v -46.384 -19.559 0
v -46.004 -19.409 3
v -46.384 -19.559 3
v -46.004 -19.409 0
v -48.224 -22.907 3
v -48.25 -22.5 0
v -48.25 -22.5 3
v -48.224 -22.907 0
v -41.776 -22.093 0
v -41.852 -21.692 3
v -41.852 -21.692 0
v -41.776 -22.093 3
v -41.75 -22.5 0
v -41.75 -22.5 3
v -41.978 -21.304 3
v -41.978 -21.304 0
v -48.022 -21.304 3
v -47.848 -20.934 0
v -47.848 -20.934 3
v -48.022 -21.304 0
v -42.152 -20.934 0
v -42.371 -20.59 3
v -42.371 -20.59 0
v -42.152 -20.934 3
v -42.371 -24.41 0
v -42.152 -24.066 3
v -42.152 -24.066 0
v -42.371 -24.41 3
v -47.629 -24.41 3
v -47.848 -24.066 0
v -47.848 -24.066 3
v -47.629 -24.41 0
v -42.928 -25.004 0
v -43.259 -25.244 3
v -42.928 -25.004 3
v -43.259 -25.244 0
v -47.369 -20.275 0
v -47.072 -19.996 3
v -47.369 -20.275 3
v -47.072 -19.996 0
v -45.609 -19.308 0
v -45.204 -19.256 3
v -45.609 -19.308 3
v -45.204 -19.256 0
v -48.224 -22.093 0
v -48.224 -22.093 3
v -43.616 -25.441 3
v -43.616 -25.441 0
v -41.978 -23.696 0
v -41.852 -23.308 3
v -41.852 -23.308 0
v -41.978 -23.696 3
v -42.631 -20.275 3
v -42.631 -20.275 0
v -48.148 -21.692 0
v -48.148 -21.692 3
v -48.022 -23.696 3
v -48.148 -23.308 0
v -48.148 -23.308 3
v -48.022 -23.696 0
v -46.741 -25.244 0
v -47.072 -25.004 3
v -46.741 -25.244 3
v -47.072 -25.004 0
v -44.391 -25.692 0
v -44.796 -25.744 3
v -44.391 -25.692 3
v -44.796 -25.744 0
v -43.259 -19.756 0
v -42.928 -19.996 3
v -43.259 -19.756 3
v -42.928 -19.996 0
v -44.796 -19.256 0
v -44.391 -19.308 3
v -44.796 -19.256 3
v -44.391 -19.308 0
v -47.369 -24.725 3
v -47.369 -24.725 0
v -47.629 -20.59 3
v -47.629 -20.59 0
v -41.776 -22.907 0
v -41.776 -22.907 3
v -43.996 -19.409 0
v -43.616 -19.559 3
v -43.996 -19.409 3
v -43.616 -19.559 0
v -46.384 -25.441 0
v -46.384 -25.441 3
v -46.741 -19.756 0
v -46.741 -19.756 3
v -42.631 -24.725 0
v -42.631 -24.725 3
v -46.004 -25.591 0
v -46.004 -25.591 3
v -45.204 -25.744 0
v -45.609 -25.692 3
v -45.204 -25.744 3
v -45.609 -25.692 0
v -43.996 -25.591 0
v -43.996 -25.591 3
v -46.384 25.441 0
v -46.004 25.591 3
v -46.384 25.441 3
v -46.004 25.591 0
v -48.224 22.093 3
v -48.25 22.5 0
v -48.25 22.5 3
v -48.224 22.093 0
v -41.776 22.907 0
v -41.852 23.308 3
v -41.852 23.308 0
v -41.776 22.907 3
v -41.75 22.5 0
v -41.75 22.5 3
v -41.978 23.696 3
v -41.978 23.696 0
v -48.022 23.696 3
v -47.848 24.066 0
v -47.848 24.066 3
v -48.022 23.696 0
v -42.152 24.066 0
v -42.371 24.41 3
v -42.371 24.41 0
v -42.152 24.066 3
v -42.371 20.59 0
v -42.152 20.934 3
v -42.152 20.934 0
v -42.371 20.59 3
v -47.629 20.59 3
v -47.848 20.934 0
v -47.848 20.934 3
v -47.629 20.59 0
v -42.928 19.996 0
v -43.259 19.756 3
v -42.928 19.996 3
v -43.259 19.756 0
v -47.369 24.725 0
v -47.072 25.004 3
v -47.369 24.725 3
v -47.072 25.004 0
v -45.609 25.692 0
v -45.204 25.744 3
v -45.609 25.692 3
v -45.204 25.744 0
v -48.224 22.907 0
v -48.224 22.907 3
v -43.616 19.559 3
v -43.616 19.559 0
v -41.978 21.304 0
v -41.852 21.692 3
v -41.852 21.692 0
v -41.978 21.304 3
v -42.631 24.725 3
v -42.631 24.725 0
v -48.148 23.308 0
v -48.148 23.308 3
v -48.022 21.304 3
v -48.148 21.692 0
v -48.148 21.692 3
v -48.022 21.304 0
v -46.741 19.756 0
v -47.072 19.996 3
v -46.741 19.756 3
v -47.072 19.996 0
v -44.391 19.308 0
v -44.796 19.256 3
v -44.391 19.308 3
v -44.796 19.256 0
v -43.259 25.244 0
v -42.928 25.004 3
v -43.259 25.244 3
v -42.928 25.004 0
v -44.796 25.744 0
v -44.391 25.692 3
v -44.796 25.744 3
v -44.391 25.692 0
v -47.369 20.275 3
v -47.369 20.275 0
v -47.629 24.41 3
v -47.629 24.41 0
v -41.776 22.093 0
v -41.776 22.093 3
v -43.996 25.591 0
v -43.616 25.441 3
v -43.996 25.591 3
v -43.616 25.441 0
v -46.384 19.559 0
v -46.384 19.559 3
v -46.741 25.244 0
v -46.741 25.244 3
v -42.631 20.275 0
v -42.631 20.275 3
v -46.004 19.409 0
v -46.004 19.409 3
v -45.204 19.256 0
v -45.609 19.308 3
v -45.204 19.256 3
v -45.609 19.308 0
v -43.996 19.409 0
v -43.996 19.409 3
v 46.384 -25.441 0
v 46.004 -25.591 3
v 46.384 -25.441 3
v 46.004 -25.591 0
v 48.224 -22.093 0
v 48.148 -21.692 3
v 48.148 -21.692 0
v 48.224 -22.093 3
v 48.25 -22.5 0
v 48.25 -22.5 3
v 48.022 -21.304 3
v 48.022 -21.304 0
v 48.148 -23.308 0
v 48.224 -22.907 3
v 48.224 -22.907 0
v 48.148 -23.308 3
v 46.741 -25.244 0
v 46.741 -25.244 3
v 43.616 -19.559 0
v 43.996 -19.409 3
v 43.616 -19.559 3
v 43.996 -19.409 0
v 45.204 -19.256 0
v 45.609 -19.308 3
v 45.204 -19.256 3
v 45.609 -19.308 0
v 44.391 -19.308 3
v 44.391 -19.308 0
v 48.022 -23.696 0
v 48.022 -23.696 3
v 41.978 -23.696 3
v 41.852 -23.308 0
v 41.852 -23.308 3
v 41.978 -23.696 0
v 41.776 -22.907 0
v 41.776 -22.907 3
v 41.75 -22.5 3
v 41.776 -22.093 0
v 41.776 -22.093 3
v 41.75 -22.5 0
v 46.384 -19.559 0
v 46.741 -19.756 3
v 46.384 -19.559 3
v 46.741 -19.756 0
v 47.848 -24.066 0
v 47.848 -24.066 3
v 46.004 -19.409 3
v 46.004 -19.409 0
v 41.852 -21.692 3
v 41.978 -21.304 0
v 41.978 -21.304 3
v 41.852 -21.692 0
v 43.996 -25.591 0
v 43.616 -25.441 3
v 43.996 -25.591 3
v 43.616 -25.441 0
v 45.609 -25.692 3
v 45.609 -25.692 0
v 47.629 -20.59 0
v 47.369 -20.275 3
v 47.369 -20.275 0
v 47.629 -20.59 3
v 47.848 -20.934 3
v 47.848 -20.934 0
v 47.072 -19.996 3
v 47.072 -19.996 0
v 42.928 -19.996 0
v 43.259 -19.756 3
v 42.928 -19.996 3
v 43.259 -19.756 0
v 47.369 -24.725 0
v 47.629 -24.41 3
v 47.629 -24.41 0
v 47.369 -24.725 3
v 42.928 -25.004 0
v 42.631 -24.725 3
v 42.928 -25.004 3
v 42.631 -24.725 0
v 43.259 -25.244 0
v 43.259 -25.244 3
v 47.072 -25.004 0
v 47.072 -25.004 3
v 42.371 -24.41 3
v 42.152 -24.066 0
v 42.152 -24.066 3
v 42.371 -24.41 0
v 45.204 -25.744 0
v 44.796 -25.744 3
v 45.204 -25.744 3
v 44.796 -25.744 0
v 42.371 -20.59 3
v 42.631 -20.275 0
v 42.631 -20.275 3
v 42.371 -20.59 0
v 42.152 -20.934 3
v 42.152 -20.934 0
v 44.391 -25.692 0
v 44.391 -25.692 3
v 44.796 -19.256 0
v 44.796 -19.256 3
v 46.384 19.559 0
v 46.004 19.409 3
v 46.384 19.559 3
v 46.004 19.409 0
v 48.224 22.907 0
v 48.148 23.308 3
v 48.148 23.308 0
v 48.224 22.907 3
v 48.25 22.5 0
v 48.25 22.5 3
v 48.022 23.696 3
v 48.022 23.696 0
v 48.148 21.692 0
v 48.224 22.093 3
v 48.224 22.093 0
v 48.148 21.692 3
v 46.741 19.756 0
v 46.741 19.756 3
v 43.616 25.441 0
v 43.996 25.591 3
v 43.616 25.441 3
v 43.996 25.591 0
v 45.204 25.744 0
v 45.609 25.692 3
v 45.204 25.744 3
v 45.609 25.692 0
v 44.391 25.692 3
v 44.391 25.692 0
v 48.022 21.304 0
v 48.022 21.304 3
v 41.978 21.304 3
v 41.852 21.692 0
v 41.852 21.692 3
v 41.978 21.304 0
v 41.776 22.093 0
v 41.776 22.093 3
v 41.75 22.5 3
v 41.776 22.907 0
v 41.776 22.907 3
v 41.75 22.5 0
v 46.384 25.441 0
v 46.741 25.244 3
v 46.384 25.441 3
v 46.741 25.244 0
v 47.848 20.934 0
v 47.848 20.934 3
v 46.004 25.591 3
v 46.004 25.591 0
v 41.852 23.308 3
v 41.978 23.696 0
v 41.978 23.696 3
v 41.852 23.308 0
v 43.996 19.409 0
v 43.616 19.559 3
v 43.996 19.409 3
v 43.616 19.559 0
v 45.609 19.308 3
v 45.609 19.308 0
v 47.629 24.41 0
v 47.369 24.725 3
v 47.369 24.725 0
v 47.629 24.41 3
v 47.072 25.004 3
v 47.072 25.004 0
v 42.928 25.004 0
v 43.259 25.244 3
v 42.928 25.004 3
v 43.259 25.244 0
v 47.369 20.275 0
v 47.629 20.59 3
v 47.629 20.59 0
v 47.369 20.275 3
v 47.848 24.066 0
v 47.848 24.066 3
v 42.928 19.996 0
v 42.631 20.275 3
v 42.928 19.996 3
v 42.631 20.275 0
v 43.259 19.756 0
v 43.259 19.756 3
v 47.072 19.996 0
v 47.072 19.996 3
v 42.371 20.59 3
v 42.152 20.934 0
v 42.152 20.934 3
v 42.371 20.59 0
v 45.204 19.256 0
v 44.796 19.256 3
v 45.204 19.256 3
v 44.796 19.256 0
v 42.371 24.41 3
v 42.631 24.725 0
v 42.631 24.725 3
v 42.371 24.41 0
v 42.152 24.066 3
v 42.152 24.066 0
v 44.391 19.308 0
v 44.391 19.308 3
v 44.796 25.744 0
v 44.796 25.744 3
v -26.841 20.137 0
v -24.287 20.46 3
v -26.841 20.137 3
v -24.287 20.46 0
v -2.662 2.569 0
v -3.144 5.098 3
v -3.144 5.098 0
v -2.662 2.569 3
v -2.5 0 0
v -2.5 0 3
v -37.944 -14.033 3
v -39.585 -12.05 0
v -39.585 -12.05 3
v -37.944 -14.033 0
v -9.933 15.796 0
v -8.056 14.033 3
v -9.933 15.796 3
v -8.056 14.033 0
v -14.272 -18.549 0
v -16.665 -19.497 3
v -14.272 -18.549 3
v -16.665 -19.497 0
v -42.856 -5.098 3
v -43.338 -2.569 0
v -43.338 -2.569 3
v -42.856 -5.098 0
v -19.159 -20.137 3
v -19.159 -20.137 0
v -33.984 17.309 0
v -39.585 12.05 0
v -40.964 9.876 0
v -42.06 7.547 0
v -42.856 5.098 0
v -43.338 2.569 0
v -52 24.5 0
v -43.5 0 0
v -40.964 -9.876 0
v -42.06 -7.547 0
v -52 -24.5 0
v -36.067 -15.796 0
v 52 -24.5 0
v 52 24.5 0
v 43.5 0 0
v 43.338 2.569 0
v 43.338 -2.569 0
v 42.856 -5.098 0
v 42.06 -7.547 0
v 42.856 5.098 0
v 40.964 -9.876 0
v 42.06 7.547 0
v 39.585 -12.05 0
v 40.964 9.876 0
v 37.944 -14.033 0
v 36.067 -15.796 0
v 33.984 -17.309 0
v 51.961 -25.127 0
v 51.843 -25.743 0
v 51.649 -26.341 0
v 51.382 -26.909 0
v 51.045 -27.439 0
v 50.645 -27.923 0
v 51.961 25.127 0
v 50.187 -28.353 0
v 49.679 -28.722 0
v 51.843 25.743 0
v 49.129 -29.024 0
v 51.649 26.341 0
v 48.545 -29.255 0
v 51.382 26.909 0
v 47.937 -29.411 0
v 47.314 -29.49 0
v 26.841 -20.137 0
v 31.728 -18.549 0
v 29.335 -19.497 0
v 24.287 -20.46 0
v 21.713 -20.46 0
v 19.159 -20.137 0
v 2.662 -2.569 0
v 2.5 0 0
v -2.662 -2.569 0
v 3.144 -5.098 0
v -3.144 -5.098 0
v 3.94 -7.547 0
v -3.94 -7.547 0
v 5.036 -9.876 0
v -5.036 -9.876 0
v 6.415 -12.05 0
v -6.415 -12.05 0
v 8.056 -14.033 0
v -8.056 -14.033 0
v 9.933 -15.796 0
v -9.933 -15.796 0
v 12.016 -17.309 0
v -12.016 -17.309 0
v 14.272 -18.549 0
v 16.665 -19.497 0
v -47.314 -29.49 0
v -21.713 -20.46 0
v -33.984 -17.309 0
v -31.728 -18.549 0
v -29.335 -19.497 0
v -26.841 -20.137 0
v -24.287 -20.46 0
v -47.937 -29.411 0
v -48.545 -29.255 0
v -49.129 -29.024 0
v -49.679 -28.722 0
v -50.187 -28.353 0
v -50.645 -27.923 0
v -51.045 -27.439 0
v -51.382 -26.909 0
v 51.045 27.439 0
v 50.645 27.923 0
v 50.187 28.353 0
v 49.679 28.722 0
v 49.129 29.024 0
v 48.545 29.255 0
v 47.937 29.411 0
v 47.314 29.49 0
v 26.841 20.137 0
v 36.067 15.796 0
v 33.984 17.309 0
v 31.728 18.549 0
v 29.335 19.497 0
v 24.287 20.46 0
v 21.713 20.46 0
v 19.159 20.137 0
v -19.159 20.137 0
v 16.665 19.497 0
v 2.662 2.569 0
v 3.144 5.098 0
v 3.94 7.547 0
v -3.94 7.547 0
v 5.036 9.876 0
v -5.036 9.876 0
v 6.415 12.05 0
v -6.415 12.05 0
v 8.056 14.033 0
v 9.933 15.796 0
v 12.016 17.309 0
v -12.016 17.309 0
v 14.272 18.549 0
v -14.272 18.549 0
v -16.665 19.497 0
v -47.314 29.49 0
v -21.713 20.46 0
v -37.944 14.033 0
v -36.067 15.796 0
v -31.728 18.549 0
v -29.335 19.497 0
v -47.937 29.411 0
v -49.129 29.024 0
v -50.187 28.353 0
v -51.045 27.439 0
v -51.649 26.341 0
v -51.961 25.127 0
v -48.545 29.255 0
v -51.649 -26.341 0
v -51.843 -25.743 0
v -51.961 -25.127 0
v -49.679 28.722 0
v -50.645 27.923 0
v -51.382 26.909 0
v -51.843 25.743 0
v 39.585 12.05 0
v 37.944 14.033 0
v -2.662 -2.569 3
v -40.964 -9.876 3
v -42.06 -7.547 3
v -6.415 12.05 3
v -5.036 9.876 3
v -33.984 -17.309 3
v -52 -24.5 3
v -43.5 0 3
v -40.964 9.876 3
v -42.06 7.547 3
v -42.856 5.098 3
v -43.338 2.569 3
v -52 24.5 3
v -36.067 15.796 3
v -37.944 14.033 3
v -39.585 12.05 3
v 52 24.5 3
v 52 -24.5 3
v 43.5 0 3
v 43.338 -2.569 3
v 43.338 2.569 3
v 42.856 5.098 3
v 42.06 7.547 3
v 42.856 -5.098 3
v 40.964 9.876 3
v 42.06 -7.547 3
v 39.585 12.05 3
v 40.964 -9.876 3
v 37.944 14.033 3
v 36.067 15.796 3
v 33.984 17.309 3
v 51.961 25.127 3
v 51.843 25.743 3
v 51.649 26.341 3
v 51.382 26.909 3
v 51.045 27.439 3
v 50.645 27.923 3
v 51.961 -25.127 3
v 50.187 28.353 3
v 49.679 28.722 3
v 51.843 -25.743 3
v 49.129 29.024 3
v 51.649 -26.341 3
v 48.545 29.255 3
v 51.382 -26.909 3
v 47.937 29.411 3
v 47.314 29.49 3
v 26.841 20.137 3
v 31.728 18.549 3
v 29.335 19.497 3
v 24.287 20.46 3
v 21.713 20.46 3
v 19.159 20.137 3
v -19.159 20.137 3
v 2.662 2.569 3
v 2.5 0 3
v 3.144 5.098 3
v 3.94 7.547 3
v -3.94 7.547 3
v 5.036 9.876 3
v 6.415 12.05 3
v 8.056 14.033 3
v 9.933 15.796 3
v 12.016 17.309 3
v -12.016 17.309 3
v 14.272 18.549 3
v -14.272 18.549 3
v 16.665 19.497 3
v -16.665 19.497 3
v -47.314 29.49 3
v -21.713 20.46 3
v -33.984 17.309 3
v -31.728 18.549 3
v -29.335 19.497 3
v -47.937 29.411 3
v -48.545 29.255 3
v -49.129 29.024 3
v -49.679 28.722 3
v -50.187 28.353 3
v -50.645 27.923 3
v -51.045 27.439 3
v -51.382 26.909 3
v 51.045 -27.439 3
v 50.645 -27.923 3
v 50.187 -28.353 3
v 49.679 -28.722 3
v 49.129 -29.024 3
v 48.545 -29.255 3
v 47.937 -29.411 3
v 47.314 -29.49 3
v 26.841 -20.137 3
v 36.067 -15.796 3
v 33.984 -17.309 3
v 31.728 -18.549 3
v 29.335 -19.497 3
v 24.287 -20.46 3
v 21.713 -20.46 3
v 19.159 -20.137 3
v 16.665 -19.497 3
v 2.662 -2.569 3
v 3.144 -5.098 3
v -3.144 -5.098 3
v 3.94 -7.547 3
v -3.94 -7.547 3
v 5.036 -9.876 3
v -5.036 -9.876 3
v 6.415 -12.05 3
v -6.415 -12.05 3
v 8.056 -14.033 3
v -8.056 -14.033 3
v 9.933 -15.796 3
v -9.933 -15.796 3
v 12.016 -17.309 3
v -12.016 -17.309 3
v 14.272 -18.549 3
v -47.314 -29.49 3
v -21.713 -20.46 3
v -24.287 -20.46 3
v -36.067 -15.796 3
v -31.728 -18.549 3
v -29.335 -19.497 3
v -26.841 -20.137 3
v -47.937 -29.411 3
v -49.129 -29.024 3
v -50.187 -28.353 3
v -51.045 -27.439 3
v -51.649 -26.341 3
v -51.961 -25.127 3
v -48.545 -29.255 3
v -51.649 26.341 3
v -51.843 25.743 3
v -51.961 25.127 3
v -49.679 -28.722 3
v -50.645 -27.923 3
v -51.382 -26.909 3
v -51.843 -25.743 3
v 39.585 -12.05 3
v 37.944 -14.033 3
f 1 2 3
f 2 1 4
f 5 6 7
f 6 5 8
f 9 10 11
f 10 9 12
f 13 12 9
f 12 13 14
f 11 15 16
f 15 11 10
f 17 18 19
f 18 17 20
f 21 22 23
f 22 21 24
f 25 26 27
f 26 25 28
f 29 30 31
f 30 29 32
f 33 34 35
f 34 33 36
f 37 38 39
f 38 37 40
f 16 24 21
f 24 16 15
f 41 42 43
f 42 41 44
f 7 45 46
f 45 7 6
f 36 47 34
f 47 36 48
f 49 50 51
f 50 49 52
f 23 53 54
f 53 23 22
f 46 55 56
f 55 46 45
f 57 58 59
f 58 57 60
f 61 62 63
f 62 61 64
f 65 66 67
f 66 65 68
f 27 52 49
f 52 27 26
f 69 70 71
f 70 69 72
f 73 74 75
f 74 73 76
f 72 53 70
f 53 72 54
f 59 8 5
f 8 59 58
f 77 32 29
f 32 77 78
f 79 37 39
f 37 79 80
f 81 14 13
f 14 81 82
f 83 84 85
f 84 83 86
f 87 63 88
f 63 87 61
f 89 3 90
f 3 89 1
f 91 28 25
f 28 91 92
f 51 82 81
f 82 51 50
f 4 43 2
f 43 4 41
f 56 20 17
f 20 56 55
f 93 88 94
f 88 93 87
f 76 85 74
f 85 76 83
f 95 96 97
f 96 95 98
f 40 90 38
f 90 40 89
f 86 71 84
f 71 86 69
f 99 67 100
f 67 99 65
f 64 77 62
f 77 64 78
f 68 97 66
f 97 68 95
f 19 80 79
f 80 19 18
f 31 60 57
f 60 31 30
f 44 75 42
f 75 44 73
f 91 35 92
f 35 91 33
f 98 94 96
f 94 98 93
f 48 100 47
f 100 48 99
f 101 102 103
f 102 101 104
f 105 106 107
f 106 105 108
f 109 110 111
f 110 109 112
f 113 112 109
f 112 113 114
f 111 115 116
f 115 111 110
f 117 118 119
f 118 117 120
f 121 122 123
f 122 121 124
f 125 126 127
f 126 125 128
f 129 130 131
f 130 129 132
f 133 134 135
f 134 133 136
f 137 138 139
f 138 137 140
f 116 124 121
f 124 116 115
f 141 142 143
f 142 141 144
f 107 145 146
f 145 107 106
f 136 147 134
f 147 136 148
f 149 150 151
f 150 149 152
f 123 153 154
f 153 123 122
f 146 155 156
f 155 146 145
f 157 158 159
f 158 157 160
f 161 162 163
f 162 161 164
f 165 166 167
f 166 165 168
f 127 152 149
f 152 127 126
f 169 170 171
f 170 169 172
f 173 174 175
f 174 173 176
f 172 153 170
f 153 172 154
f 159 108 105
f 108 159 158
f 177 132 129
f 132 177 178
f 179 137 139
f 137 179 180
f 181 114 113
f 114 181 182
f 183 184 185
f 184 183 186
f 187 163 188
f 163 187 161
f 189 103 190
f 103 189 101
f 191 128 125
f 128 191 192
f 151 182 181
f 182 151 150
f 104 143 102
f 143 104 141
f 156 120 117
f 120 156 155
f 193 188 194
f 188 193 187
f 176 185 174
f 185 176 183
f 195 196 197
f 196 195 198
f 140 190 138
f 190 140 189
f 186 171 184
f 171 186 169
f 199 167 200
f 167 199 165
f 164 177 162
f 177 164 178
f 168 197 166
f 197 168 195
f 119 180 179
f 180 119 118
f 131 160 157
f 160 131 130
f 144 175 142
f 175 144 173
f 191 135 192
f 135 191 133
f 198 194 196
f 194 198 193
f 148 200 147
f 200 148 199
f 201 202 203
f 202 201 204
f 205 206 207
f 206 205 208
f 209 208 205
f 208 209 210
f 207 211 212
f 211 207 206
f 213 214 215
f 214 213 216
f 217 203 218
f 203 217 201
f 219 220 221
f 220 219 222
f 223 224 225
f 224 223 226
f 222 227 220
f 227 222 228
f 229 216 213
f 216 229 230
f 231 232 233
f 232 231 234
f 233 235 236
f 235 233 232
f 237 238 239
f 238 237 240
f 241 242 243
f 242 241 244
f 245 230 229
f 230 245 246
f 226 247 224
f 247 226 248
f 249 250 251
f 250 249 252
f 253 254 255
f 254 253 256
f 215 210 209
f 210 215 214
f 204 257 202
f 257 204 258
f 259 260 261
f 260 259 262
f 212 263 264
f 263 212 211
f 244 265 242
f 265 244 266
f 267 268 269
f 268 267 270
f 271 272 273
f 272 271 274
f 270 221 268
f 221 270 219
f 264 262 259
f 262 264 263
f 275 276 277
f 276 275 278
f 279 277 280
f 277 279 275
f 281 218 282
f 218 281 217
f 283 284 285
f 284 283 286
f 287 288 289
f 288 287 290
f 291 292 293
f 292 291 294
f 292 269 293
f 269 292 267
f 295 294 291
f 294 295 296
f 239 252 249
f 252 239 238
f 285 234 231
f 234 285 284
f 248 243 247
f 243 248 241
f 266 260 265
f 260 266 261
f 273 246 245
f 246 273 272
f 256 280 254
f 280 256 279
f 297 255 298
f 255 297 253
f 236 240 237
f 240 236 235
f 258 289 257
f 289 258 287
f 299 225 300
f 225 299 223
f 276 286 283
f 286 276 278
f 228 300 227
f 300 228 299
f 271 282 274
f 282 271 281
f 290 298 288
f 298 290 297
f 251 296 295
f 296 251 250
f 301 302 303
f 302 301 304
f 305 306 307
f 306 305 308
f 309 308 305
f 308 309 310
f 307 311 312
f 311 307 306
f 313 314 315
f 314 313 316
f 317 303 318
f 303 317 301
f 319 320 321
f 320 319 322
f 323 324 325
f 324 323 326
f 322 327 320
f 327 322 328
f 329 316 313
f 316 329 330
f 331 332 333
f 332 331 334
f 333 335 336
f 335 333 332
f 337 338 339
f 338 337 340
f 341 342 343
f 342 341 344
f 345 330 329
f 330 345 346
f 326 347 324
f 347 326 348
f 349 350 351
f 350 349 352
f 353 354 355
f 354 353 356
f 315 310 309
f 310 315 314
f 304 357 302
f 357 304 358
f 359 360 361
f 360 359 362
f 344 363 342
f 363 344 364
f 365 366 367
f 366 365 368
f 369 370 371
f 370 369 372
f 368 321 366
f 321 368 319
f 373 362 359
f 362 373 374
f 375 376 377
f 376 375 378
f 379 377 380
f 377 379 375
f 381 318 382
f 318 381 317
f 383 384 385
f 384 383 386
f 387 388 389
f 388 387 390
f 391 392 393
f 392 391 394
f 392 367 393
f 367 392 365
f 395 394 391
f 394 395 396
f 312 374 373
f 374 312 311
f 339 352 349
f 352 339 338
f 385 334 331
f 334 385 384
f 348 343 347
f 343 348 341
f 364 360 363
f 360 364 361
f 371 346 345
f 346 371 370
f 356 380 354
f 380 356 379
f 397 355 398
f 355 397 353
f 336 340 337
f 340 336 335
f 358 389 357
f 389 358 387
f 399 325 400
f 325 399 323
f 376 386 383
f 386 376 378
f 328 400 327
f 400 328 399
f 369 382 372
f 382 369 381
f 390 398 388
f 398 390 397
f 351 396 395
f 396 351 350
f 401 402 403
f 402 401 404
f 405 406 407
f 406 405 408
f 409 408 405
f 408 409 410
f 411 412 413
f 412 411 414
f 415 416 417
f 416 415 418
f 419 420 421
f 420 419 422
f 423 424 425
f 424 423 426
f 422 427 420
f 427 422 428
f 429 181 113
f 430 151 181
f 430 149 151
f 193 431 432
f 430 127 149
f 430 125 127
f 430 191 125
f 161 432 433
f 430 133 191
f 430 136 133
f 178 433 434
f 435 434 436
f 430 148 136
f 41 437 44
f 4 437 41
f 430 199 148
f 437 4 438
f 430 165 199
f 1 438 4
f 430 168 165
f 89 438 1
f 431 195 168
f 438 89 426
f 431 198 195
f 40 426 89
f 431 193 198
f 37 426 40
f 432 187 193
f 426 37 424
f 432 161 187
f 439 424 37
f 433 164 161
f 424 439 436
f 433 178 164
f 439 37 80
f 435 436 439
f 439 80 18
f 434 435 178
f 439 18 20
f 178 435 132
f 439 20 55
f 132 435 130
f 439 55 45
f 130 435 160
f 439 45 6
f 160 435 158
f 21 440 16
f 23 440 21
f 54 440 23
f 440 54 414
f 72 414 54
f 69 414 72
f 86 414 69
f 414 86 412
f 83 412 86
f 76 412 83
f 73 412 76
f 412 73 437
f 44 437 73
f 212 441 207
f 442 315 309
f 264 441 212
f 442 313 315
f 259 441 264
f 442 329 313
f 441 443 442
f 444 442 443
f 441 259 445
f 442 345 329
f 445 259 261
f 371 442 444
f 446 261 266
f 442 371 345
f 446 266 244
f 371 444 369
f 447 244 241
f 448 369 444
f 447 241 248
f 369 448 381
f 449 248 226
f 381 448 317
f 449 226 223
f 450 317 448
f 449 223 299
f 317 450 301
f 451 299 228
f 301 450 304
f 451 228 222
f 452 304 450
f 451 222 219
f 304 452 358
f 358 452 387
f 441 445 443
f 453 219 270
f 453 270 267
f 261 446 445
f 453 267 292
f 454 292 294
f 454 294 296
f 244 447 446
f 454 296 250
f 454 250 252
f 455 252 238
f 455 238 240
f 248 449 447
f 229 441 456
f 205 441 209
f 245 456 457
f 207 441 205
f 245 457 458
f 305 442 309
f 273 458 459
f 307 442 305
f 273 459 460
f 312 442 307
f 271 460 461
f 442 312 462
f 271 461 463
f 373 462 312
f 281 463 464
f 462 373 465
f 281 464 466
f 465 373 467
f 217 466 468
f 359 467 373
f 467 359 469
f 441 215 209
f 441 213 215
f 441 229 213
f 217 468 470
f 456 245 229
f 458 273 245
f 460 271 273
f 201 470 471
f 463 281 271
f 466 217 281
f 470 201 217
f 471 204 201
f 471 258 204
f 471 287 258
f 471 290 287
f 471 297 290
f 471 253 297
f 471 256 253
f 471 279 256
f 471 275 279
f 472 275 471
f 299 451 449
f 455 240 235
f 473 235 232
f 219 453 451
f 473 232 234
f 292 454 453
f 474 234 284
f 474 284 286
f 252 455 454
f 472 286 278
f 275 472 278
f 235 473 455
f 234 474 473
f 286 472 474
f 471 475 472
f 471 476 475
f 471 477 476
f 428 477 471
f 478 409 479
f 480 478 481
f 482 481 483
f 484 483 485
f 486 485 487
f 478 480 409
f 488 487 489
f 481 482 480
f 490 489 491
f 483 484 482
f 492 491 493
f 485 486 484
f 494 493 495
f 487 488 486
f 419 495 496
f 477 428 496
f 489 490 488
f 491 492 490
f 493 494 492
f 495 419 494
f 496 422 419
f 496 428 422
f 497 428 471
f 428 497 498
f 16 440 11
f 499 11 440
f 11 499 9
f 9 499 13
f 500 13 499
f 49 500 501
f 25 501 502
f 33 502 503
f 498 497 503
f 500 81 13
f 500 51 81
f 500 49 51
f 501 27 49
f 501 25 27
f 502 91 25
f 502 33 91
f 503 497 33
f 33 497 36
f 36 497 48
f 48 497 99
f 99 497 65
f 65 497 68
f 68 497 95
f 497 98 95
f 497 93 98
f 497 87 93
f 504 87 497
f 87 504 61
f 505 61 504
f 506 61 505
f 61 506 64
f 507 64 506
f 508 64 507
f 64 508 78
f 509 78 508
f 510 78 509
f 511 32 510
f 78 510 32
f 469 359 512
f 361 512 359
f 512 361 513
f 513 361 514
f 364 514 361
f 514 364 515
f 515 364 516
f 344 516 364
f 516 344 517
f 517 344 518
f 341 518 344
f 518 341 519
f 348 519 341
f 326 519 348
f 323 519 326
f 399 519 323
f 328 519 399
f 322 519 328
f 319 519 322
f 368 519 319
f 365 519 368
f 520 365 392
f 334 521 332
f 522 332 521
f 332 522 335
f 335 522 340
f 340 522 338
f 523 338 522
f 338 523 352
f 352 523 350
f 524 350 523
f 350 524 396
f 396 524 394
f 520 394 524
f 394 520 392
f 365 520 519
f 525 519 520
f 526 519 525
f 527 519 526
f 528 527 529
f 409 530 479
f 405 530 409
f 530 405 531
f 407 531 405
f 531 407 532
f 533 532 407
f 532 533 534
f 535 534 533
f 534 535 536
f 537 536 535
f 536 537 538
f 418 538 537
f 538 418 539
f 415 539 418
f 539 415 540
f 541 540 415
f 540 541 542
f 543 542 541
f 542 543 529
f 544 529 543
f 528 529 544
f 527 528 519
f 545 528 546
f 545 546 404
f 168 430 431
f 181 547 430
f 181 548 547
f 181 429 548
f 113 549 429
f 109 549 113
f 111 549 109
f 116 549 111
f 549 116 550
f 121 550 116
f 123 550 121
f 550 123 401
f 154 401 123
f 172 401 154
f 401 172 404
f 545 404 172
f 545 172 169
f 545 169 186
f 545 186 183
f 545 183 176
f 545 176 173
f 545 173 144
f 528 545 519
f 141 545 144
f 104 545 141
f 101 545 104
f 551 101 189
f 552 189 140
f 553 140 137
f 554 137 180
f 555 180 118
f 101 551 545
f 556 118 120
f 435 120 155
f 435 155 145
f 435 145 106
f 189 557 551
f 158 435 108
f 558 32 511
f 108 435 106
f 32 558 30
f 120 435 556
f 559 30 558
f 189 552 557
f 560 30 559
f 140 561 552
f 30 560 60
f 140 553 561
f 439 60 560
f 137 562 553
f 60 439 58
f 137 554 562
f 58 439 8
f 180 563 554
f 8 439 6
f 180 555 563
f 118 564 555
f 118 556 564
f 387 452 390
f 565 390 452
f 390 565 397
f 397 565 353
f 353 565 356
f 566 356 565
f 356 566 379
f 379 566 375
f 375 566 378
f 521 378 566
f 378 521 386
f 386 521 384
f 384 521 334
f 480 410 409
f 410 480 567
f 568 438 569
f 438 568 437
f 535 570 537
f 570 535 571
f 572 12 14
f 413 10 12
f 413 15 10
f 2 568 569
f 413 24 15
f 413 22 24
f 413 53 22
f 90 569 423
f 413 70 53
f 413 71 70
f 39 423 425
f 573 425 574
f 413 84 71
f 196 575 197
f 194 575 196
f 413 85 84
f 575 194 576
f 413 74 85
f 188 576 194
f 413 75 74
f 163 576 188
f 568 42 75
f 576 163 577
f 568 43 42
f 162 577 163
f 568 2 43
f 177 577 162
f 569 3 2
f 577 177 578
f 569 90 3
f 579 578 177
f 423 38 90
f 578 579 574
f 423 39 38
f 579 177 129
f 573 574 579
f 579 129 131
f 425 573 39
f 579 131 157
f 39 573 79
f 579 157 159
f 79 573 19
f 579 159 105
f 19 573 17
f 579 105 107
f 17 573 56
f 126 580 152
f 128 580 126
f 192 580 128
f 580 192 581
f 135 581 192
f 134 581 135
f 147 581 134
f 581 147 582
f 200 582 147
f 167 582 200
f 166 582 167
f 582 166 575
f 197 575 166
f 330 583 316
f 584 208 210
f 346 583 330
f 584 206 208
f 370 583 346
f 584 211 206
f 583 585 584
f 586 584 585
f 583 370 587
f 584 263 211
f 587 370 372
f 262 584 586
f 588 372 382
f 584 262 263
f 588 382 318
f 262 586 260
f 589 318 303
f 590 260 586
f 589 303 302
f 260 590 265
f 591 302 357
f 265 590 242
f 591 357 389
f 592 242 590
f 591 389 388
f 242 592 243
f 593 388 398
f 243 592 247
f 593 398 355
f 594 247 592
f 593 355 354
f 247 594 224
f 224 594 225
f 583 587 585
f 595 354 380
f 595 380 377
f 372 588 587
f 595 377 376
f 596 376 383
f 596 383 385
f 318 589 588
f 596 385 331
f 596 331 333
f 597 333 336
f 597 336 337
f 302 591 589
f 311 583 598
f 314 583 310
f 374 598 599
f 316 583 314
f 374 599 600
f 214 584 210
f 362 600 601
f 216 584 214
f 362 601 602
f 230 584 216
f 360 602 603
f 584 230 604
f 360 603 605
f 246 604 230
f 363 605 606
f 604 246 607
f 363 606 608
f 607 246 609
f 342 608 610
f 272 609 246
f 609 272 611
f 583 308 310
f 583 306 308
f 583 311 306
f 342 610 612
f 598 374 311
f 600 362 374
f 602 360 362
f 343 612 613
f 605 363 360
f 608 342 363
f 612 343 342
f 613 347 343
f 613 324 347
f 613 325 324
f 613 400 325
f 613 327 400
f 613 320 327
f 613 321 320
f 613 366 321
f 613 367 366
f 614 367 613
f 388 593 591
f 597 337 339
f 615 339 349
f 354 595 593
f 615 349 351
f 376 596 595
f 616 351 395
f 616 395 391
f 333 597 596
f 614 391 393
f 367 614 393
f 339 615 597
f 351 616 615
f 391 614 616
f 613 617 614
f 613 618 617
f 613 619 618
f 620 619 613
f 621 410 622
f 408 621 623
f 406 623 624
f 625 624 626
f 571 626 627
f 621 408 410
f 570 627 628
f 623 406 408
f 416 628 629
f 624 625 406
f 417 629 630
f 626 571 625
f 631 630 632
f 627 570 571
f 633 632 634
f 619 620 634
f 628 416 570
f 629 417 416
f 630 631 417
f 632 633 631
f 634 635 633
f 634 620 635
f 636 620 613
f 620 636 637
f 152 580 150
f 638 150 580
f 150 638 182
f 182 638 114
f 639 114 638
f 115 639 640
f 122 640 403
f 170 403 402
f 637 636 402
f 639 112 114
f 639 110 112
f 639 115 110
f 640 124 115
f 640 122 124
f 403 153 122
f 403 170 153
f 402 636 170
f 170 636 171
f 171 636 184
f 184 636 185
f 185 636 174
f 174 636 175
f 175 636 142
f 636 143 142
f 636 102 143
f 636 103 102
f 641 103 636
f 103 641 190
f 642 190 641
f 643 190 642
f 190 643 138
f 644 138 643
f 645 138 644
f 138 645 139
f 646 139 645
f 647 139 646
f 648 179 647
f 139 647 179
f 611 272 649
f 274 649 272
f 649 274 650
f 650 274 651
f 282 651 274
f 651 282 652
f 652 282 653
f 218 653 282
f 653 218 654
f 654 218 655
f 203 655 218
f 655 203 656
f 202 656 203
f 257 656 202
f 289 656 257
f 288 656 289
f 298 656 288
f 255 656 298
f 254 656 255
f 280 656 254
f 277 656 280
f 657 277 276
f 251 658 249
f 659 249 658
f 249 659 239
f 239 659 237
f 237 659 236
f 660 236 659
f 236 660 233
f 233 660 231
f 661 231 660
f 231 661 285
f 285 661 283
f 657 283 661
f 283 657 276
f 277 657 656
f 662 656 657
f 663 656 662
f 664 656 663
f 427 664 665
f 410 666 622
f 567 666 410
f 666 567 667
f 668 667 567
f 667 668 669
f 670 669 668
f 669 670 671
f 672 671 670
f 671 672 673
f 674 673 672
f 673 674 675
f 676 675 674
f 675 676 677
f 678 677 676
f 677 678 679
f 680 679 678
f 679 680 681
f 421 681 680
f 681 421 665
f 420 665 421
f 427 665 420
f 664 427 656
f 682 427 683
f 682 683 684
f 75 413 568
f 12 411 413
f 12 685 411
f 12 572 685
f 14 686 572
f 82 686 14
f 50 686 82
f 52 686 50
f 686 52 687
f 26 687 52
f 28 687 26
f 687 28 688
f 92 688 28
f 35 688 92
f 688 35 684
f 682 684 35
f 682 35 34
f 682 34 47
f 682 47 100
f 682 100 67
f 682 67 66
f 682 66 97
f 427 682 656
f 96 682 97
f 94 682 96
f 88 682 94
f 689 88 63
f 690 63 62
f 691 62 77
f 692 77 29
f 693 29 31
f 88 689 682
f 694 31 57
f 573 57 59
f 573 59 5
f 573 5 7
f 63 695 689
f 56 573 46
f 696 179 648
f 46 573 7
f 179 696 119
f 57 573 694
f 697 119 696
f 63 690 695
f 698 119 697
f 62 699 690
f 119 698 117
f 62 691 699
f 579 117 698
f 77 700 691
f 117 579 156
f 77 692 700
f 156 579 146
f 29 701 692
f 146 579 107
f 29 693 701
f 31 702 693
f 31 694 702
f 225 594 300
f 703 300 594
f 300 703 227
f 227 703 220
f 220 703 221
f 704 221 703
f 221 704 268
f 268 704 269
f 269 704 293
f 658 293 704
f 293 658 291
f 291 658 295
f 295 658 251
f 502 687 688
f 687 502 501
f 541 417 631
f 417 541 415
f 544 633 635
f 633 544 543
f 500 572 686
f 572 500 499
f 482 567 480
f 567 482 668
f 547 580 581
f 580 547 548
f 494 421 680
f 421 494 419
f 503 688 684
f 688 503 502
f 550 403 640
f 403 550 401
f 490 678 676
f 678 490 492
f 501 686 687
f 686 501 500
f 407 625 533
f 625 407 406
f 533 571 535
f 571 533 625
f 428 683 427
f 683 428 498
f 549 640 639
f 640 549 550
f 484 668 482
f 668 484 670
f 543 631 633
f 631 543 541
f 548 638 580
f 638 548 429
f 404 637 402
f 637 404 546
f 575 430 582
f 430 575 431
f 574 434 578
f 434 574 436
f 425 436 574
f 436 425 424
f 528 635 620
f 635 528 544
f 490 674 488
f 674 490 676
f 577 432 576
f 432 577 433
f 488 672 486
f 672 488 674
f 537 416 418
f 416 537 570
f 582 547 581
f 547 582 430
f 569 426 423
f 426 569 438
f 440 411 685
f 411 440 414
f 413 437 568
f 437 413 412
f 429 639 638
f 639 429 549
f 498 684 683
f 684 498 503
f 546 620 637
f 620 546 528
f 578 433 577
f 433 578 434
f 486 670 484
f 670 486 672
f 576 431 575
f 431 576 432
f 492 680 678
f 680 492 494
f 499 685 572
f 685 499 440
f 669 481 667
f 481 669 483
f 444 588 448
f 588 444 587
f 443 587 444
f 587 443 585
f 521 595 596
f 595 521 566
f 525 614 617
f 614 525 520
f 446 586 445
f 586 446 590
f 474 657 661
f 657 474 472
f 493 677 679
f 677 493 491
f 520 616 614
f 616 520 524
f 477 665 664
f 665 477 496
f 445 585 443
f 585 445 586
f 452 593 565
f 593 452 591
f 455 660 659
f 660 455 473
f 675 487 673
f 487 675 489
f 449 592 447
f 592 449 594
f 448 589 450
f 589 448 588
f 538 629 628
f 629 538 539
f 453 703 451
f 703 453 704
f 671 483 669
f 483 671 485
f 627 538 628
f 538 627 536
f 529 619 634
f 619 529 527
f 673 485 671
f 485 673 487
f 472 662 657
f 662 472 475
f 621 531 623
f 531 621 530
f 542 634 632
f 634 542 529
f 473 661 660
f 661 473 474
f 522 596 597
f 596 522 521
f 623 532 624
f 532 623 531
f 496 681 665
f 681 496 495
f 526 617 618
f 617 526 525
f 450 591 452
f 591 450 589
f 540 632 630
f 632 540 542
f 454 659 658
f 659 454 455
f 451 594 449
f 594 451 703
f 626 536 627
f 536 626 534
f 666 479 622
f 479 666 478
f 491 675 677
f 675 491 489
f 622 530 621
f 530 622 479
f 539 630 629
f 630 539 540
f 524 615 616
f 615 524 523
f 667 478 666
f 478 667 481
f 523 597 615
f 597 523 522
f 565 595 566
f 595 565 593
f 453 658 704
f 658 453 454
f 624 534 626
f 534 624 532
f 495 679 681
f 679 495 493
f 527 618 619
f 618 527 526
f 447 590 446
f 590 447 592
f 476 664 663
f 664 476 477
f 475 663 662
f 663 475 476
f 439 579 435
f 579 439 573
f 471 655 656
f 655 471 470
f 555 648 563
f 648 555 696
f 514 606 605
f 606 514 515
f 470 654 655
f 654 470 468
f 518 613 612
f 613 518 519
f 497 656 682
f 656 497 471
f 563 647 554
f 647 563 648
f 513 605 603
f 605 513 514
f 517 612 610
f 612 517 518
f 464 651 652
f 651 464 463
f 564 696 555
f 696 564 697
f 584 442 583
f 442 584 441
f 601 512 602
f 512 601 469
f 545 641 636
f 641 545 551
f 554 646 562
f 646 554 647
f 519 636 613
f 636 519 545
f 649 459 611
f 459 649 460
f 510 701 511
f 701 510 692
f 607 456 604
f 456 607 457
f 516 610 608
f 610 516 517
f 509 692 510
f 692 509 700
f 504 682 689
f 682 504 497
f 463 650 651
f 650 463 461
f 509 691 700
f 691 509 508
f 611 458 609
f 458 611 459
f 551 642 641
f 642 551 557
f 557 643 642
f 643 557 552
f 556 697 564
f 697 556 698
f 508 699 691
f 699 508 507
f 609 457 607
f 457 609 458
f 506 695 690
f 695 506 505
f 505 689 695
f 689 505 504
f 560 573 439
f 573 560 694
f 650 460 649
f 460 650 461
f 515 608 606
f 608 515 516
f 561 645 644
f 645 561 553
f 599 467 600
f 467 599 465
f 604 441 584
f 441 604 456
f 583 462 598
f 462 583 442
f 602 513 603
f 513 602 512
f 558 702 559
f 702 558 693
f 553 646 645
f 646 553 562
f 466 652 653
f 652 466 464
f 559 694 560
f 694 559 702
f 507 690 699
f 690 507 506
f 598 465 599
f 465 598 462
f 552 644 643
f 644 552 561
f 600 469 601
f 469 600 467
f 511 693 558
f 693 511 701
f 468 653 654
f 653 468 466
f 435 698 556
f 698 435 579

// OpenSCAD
$fn = 50;


difference() {
	union() {
		hull() {
			translate(v = [-47.0000000000, 24.5000000000, 0]) {
				cylinder(h = 3, r = 5);
			}
			translate(v = [47.0000000000, 24.5000000000, 0]) {
				cylinder(h = 3, r = 5);
			}
			translate(v = [-47.0000000000, -24.5000000000, 0]) {
				cylinder(h = 3, r = 5);
			}
			translate(v = [47.0000000000, -24.5000000000, 0]) {
				cylinder(h = 3, r = 5);
			}
		}
	}
	union() {
		#translate(v = [-45.0000000000, -22.5000000000, -100.0000000000]) {
			cylinder(h = 200, r = 3.2500000000);
		}
		#translate(v = [-45.0000000000, 22.5000000000, -100.0000000000]) {
			cylinder(h = 200, r = 3.2500000000);
		}
		#translate(v = [45.0000000000, -22.5000000000, -100.0000000000]) {
			cylinder(h = 200, r = 3.2500000000);
		}
		#translate(v = [45.0000000000, 22.5000000000, -100.0000000000]) {
			cylinder(h = 200, r = 3.2500000000);
		}
		#translate(v = [-23.0000000000, 0, 0]) {
			cylinder(h = 3, r = 20.5000000000);
		}
		#translate(v = [23.0000000000, 0, 0]) {
			cylinder(h = 3, r = 20.5000000000);
		}
	}
}
